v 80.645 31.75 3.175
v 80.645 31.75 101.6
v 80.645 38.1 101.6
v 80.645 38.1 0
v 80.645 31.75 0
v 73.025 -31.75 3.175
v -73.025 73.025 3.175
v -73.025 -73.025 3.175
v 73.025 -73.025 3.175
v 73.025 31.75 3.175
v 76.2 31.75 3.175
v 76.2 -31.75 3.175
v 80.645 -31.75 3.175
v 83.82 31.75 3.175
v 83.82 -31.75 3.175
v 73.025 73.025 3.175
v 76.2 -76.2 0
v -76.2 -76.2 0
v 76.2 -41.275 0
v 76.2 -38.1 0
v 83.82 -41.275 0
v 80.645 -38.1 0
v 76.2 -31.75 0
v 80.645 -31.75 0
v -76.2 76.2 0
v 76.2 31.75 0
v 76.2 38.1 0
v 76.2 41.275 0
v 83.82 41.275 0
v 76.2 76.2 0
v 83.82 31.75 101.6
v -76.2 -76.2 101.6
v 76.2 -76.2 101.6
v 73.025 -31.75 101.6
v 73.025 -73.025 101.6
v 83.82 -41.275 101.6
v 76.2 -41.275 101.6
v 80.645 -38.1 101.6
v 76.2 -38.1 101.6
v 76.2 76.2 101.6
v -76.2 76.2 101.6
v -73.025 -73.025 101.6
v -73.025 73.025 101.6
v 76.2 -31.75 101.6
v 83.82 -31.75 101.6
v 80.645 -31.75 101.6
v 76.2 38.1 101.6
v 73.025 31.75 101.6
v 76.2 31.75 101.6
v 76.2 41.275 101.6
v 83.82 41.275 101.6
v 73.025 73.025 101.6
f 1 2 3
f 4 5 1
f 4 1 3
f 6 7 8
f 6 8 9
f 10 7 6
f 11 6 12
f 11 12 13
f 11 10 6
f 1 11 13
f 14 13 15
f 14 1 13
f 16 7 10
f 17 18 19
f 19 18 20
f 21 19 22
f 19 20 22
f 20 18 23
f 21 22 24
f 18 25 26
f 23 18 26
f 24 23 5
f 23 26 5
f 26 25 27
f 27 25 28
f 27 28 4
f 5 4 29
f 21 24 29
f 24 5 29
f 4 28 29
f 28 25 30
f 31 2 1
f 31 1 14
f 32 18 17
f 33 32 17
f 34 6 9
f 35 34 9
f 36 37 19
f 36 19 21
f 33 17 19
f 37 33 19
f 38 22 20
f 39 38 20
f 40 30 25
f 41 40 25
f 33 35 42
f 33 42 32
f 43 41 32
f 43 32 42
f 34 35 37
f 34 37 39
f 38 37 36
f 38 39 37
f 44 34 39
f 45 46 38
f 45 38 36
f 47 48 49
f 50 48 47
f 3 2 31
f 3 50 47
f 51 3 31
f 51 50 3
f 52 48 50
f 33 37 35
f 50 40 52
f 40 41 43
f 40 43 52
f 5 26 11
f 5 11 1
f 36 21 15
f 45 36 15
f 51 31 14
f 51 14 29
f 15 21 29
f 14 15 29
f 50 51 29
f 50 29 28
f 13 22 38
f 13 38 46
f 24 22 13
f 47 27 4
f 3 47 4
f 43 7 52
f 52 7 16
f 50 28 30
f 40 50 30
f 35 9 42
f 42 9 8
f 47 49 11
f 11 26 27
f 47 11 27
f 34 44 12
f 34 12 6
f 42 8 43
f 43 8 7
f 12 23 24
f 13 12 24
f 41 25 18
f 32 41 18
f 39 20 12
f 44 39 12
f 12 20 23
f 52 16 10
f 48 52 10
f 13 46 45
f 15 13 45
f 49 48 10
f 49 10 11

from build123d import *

# Parameters (mm, degrees)
F0_W     = 3.175
F0_H     = 6.35
F0_H_2   = 146.05
F1_DEPTH = 101.6
F2_W     = 10.795
F2_H     = 63.5
F3_DEPTH = 3.175


with BuildPart() as f1:
    # F0 (on Top) → F1 (new body)
    with BuildSketch(Plane.XY):
        Polygon((-76.2, 76.2), (-76.2, 73.025), (-73.025, 73.025), (73.025, 73.025), (76.2, 73.025), (76.2, 76.2), align=None)
        Polygon((73.025, -31.75), (73.025, -73.025), (76.2, -73.025), (76.2, -41.275), (76.2, -38.1), (76.2, -31.75), align=None)
        with Locations((82.2325, 34.925)):
            Rectangle(F0_W, F0_H)
        Polygon((-73.025, -73.025), (-76.2, -73.025), (-76.2, -76.2), (76.2, -76.2), (76.2, -73.025), (73.025, -73.025), align=None)
        Polygon((76.2, -38.1), (76.2, -41.275), (83.82, -41.275), (83.82, -38.1), (80.645, -38.1), align=None)
        with Locations((82.2325, -34.925)):
            Rectangle(F0_W, F0_H)
        Polygon((76.2, 73.025), (73.025, 73.025), (73.025, 31.75), (76.2, 31.75), (76.2, 38.1), (76.2, 41.275), align=None)
        Polygon((83.82, 41.275), (76.2, 41.275), (76.2, 38.1), (80.645, 38.1), (83.82, 38.1), align=None)
        with Locations((-74.6125, 0)):
            Rectangle(F0_W, F0_H_2)
    extrude(amount=F1_DEPTH)

    # F2 (on Top) → F3 (join)
    with BuildSketch(Plane.XY):
        Polygon((73.025, 31.75), (73.025, 73.025), (-73.025, 73.025), (-73.025, -73.025), (73.025, -73.025), (73.025, -31.75), align=None)
        with Locations((78.4225, 0)):
            Rectangle(F2_W, F2_H)
    extrude(amount=F3_DEPTH)


solid = f1.part
